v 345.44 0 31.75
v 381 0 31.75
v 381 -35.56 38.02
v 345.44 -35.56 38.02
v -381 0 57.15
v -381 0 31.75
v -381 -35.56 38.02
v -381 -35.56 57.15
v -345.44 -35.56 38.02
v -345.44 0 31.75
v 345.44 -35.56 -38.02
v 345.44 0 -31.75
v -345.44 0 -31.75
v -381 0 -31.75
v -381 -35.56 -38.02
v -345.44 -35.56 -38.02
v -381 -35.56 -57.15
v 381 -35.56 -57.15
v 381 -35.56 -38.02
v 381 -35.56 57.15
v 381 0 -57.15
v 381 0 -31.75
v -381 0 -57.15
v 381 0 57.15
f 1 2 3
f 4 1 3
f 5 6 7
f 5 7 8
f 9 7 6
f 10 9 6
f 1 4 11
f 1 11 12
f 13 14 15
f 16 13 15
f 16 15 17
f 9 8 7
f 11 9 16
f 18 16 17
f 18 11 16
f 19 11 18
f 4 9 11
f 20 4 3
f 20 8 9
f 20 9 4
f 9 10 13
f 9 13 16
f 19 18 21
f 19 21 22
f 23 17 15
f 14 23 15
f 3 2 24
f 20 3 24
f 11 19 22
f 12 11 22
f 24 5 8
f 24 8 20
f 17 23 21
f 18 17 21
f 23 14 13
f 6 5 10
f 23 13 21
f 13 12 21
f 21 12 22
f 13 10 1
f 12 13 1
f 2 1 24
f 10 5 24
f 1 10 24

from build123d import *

# Parameters (mm, degrees)
F0_W     = 762
F0_H     = 114.3
F1_DEPTH = 35.56
F3_DEPTH = 35.56
F5_DEPTH = 35.56


with BuildPart() as f1:
    # F0 (on Front) → F1 (new body)
    with BuildSketch(Plane.XZ):
        Rectangle(F0_W, F0_H)
    extrude(amount=F1_DEPTH)

    # F2 (on face) → F3 (cut)
    with BuildSketch(Plane(origin=(-381, 0, 0), x_dir=(0, -1, 0), z_dir=(-1, 0, 0))):
        Polygon((35.56, 38.020187), (0, 31.75), (0, -31.75), (35.56, -38.020187), align=None)
    extrude(amount=-F3_DEPTH, mode=Mode.SUBTRACT)

    # F4 (on face) → F5 (cut)
    with BuildSketch(Plane.YZ.offset(381)):
        Polygon((0, 31.75), (-35.56, 38.020187), (-35.56, -38.020187), (0, -31.75), align=None)
    extrude(amount=-F5_DEPTH, mode=Mode.SUBTRACT)


solid = f1.part
